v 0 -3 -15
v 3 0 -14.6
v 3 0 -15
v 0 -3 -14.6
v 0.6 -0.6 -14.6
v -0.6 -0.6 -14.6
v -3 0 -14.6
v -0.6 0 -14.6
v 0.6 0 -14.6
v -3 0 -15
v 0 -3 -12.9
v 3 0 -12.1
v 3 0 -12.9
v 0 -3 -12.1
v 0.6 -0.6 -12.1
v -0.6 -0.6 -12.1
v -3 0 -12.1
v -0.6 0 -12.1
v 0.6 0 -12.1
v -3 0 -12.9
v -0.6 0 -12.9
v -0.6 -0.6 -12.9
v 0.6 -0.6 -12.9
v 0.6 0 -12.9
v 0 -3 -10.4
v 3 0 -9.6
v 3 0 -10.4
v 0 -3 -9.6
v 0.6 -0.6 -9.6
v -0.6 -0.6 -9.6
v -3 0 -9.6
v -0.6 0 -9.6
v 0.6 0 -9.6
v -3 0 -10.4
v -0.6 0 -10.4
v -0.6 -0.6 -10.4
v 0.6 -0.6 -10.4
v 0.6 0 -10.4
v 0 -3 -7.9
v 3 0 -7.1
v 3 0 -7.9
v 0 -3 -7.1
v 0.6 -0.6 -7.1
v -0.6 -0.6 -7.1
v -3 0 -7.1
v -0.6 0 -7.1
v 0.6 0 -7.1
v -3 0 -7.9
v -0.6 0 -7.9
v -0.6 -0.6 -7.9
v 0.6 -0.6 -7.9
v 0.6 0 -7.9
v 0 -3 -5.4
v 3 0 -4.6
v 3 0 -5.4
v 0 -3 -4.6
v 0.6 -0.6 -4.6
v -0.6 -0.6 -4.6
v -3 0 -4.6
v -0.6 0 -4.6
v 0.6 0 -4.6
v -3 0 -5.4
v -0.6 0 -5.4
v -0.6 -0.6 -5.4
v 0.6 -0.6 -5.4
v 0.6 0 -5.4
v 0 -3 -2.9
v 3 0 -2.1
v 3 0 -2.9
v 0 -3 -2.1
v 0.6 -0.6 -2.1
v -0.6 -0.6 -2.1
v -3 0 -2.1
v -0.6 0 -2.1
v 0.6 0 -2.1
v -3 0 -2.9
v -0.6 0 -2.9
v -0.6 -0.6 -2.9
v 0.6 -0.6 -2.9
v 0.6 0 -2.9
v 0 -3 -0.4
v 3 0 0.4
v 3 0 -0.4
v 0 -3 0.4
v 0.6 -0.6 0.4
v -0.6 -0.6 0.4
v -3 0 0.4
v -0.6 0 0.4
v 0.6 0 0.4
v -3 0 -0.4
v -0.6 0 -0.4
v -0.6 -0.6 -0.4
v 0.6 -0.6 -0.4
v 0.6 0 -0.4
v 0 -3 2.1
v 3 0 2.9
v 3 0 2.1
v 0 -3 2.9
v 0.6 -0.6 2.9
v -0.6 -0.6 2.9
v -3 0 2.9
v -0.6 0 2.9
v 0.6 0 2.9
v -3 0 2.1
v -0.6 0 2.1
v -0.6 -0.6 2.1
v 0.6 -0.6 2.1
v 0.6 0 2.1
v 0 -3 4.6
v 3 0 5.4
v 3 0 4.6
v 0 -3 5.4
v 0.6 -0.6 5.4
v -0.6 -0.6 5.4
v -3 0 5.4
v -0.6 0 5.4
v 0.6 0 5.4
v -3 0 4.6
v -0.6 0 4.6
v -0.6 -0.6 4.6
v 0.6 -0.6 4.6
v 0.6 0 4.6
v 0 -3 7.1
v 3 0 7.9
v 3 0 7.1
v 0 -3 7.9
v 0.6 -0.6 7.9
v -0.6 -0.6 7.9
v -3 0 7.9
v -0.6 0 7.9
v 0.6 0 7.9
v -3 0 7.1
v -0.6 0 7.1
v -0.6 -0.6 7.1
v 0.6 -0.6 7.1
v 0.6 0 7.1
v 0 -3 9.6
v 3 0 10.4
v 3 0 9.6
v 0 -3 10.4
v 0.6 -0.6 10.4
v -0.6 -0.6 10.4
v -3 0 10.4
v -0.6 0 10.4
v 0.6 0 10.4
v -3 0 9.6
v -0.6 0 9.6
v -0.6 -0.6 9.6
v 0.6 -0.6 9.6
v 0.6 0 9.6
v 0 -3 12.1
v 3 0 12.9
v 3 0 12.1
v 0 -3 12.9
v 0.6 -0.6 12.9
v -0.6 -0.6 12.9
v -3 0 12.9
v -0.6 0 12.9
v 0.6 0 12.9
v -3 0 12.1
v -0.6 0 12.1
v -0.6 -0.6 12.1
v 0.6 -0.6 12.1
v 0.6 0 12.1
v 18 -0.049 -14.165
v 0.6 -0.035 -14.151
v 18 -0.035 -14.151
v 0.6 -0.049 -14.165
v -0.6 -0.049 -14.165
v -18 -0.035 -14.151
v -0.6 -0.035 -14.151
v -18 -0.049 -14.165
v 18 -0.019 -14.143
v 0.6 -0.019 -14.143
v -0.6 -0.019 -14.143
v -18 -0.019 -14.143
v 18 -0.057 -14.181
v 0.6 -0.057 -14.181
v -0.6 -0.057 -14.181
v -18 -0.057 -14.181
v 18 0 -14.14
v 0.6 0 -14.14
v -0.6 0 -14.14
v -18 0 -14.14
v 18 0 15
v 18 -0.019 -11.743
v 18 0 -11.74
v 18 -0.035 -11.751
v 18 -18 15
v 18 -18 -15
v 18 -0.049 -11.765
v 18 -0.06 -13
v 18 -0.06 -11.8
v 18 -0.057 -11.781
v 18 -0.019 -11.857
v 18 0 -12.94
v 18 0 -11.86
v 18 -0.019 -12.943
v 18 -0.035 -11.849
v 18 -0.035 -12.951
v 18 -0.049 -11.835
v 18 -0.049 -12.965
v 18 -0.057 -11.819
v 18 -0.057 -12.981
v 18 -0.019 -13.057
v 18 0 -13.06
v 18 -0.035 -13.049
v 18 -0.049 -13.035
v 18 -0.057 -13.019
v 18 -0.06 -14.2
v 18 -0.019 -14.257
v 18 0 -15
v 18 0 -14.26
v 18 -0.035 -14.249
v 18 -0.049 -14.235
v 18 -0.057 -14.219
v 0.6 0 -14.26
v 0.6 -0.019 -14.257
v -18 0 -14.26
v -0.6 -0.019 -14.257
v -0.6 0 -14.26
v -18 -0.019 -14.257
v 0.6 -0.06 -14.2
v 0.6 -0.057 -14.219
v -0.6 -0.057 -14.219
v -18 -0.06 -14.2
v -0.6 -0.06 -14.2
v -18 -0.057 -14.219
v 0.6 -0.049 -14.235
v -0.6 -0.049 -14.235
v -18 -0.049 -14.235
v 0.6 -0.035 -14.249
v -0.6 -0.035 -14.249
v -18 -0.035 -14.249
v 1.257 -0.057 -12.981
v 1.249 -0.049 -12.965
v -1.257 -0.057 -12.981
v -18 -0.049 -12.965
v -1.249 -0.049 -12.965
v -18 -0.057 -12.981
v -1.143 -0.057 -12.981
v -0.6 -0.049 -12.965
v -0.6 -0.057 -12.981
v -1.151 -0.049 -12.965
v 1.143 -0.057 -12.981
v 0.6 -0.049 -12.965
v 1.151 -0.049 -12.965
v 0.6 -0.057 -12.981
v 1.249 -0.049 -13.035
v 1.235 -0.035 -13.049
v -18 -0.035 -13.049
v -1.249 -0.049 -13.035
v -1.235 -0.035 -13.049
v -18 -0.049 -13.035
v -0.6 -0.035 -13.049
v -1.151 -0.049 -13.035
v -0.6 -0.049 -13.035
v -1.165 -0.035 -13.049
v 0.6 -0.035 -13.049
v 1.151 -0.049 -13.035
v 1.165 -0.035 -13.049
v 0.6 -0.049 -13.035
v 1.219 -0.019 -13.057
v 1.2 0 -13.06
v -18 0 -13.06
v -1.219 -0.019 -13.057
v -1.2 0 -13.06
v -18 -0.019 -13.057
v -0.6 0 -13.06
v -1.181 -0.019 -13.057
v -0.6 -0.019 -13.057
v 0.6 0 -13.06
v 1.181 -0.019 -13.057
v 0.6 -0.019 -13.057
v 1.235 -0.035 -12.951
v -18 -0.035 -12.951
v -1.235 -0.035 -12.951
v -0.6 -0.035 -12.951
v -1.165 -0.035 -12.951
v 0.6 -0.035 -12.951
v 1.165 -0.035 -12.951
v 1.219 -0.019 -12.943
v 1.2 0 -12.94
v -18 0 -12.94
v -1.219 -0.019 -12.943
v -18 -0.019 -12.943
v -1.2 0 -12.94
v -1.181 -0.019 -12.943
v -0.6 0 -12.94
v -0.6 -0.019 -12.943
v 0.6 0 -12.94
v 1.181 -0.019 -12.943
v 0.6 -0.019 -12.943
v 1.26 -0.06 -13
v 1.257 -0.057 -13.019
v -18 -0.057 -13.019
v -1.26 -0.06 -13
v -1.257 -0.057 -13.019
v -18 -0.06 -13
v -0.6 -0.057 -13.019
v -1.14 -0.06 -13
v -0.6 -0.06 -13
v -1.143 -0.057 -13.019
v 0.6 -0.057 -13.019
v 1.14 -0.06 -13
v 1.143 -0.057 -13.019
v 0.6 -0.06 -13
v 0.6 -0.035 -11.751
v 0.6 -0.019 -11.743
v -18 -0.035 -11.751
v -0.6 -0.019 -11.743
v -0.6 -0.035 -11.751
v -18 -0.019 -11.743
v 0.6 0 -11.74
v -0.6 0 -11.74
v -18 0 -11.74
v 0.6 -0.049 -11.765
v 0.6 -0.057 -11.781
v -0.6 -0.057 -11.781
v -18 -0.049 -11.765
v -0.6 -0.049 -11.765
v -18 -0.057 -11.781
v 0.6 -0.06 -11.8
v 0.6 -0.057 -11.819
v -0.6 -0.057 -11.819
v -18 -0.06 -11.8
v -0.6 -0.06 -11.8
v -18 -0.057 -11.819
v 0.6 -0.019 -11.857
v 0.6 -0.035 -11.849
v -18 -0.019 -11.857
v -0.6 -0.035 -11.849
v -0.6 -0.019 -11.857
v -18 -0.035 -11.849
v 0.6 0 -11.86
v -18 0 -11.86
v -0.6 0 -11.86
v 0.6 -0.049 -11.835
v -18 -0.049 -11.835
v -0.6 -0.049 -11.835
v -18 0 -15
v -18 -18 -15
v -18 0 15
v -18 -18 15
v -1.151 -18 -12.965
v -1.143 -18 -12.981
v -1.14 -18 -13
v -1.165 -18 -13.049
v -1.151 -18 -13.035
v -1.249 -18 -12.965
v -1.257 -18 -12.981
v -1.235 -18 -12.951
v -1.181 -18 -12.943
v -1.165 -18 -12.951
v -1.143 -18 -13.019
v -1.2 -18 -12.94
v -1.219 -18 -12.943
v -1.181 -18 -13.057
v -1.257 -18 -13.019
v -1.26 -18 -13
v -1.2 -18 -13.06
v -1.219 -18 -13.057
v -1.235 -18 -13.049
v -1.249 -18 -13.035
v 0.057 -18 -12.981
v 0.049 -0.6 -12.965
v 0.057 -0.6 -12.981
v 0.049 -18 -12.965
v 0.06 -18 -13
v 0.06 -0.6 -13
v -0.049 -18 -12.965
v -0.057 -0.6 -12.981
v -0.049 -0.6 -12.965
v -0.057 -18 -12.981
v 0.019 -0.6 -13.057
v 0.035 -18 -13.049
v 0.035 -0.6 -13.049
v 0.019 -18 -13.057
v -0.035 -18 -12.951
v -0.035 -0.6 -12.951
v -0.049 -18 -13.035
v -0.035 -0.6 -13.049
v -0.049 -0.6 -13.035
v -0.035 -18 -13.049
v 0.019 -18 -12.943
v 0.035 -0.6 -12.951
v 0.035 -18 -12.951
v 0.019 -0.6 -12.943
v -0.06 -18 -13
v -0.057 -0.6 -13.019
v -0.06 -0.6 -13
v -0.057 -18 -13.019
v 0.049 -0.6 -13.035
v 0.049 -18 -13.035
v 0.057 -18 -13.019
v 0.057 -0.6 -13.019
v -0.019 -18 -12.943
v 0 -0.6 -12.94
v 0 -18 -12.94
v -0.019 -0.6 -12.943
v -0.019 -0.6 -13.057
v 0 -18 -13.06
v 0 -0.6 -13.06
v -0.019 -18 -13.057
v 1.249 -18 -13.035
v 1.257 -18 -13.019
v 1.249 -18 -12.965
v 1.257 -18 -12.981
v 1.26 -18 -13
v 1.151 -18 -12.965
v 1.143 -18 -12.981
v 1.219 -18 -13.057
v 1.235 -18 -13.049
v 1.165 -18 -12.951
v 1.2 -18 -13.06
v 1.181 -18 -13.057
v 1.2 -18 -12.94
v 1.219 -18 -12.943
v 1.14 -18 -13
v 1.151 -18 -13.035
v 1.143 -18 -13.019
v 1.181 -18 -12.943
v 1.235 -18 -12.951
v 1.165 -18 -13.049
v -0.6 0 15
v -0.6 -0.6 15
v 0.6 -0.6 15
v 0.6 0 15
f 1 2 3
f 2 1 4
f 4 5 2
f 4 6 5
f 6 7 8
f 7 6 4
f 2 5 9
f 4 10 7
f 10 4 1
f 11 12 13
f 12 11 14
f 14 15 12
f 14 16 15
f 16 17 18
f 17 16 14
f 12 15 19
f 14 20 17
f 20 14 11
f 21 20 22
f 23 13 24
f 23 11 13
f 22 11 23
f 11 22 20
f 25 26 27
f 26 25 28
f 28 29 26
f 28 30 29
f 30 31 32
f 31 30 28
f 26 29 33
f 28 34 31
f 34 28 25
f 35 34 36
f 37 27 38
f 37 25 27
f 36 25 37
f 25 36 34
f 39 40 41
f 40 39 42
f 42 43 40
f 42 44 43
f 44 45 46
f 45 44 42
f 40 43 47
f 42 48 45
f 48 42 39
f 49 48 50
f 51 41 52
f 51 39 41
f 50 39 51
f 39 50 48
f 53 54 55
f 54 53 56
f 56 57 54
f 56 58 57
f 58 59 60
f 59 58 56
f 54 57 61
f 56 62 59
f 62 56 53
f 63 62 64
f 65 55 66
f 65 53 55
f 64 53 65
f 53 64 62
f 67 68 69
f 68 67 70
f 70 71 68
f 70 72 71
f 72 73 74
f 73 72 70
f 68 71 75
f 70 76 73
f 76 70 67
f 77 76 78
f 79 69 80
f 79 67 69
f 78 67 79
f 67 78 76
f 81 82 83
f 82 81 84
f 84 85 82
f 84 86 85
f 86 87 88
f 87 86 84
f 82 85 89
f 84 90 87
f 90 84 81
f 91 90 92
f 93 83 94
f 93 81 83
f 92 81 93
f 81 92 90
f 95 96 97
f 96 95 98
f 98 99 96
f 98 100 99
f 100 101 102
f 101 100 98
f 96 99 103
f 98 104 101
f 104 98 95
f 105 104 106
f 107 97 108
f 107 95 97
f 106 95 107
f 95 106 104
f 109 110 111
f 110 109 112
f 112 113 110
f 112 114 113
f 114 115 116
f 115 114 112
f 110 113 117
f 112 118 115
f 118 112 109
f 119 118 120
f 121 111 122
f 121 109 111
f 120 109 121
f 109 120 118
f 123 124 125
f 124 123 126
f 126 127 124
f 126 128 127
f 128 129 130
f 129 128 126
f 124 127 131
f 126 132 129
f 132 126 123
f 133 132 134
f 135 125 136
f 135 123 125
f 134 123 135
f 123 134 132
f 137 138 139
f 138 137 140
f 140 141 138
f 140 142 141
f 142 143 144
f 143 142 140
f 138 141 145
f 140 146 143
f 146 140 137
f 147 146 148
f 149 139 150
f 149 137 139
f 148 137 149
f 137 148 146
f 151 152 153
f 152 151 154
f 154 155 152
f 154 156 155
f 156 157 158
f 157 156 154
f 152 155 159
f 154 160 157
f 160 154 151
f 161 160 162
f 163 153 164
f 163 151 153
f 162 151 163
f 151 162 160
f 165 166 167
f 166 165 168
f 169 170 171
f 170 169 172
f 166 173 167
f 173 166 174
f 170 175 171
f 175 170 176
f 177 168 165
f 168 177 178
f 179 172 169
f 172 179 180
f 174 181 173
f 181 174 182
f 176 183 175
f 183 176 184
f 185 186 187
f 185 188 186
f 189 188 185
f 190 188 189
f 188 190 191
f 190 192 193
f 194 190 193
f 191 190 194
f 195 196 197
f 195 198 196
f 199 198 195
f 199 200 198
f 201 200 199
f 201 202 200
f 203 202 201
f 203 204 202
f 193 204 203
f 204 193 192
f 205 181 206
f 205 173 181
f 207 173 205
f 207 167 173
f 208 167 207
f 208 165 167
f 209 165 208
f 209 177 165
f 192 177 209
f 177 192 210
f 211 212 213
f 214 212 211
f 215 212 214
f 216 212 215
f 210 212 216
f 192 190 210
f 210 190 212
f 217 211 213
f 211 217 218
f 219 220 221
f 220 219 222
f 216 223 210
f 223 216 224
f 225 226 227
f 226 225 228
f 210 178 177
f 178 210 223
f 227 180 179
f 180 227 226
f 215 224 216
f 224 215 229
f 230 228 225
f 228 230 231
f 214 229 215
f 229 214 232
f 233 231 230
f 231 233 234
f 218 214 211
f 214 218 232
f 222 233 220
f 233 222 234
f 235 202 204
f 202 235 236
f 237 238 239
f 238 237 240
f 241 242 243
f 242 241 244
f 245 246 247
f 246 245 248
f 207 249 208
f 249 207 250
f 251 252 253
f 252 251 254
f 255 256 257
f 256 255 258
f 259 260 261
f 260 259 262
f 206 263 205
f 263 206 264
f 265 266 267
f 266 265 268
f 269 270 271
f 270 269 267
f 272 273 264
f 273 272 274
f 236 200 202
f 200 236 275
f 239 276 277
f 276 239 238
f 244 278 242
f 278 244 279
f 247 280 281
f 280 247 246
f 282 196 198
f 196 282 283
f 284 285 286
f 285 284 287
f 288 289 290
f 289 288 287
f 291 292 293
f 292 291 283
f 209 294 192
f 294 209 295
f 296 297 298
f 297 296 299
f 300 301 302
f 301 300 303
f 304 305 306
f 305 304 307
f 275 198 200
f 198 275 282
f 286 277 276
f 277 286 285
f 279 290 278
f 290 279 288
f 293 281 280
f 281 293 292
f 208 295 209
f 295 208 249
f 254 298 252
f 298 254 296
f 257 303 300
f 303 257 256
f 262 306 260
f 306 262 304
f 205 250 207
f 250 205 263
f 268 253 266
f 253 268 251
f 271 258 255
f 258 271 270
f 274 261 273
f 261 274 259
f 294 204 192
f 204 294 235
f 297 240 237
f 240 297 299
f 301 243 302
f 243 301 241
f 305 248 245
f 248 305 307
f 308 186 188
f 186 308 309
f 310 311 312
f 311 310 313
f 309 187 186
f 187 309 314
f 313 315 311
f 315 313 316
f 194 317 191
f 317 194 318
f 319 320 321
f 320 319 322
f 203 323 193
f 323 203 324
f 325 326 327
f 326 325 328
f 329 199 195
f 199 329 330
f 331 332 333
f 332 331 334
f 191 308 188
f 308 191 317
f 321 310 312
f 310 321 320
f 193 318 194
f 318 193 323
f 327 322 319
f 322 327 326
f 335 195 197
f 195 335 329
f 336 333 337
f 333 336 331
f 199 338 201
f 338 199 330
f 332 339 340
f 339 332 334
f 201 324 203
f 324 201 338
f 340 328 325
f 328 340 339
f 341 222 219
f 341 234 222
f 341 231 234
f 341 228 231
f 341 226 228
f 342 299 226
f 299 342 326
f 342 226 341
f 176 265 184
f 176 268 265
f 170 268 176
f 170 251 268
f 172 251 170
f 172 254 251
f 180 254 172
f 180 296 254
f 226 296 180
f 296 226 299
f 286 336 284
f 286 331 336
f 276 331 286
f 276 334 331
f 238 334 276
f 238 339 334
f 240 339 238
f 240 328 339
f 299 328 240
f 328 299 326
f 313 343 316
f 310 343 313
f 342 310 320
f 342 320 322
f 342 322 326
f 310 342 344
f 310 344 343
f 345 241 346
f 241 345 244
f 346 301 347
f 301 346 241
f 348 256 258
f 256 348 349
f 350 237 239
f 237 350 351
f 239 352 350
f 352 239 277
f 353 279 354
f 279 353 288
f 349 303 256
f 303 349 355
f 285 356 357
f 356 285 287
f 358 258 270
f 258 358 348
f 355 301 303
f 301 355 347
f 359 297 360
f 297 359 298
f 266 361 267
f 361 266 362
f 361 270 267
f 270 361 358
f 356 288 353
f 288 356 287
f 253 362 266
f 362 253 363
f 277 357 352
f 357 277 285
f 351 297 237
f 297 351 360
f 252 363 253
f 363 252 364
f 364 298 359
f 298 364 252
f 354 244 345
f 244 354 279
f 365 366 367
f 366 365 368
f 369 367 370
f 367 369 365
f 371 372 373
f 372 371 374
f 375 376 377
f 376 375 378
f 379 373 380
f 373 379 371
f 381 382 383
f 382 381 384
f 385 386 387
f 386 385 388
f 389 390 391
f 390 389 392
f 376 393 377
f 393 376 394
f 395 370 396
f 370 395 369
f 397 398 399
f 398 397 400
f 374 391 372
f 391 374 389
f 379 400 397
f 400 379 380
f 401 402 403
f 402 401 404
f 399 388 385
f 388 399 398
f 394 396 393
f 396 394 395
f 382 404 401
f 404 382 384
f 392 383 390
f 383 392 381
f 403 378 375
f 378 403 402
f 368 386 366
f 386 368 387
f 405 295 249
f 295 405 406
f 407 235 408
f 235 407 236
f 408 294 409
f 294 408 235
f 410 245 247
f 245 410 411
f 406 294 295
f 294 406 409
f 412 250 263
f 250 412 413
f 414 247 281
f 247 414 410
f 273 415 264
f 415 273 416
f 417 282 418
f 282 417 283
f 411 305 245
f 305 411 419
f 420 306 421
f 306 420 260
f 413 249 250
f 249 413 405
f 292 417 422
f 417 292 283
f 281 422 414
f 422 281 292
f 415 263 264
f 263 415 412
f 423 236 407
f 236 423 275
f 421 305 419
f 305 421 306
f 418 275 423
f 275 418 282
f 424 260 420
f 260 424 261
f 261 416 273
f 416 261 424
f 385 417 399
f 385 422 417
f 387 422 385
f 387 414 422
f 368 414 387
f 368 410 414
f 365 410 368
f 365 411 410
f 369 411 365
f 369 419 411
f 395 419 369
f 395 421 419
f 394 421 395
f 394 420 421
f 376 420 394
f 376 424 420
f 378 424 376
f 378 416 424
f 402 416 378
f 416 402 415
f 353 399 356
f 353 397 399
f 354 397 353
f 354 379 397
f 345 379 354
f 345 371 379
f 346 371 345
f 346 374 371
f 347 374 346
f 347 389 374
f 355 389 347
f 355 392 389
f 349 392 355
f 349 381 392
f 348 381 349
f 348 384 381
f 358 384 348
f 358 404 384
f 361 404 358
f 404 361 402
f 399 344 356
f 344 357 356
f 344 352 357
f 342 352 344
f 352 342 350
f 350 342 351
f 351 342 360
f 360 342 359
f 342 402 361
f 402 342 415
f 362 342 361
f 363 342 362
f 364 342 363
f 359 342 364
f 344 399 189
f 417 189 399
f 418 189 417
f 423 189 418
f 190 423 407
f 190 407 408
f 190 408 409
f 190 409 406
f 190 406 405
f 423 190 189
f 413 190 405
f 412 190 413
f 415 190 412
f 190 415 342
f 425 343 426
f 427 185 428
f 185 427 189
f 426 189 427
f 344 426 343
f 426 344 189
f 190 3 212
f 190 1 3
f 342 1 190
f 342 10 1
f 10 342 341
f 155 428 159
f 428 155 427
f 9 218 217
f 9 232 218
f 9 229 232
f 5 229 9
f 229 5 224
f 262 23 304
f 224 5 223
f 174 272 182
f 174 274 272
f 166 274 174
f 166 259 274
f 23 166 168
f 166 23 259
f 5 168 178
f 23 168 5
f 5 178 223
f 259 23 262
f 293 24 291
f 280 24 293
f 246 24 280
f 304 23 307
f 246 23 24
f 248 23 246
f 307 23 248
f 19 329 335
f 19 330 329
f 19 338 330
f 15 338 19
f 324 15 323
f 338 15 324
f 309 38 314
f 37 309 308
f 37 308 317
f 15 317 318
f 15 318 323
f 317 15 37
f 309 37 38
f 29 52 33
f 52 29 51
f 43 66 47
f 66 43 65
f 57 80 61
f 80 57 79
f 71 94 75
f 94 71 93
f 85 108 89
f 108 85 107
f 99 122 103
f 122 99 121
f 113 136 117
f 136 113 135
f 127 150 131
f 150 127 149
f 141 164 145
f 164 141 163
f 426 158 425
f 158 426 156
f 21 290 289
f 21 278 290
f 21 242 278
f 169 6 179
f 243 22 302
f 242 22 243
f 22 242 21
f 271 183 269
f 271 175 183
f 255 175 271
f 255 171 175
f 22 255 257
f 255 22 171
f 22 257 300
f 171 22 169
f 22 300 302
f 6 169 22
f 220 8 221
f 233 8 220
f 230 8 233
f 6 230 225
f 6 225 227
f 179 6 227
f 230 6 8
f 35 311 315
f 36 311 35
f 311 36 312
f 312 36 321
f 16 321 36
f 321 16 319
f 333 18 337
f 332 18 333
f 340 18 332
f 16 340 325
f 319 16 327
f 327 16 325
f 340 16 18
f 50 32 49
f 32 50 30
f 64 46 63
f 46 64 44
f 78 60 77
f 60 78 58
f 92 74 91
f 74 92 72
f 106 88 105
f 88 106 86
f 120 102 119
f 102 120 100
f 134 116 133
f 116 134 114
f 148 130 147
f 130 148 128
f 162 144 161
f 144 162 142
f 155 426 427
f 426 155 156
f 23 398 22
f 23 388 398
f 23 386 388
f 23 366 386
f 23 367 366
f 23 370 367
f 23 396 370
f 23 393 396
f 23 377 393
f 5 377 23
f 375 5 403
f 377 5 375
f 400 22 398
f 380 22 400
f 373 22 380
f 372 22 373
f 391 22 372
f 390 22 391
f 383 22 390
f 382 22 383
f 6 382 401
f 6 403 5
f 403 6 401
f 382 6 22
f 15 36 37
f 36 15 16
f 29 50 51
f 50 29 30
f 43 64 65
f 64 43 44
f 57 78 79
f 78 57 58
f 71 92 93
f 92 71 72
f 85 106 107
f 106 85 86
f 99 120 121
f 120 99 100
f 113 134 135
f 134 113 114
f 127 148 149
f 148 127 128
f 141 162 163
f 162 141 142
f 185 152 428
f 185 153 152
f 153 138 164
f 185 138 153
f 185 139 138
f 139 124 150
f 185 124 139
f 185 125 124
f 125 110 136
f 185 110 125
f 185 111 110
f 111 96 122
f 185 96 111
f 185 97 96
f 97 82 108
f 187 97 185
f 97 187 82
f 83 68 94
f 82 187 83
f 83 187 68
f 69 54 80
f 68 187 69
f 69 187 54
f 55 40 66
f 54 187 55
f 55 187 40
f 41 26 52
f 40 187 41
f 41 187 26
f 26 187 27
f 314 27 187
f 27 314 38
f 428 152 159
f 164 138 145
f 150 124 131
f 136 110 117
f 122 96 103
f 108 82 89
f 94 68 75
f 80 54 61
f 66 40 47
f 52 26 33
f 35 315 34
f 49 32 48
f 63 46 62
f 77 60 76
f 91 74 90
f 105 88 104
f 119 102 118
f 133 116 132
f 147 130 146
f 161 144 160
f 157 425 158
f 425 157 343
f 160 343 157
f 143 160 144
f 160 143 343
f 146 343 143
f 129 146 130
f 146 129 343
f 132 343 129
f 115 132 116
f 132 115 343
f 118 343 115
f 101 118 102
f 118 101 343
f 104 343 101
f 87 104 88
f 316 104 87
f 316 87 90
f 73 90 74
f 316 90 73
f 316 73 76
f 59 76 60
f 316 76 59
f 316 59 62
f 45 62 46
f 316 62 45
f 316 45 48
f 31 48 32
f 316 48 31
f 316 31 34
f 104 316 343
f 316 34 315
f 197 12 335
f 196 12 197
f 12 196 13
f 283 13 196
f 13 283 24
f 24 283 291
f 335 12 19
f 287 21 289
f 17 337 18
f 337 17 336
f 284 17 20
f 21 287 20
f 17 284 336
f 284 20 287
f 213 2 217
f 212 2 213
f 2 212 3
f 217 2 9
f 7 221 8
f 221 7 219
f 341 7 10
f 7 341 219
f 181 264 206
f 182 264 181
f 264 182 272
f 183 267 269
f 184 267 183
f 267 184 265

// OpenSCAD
// Matrix Biomimetic Utilities - Revelation-Class Cube Extrusion Engine
// Version 1.0.0-Revelation Core | Harmonic Cube-Clamping Fluid Matrix
// System Core: Zero-Contamination Fluid Shield (Nozzle-Less Mid-Air Boundary)

// ============================================================================
// 🏛️ GLOBAL PARAMETRIC VARIABLES & CUBIC BOUNDARIES
// ============================================================================
CHAMBER_CUBE_SIDE = 12.0; // Symmetrical dimension matching text framework parameters (mm)
CORE_APERTURE_W = 1.20;   // Precise central square inlet width for viscous resin (mm)
JET_DIAMETER = 0.12;      // Laser-drilled diameter of cardinal pneumatic gates (mm)
LAYER_STEP_H = 2.50;      // Vertical height height thickness of individual strata layers (mm)

// 🖨️ PROTOTYPE VIEW SELECTOR
// PREVIEW_MODE: 0 = Full Manifold Solid Cross-Section, 1 = Internal Fluid Core Path ONLY
PREVIEW_MODE = 0;

if (PREVIEW_MODE == 0) {
    difference() {
        Revelation_Manifold_Block();
        // Symmetrical cutting plane to display the internal pneumatic gates in the viewport
        translate([0, 50, 0]) cube([100, 100, 100], center=true);
    }
} else if (PREVIEW_MODE == 1) {
    %Fluid_Core_Pneumatic_Shield_Path();
}

// ============================================================================
// ⚙️ HYDRODYNAMIC EXTENSION ENGINE MODULES
// ============================================================================

module Revelation_Manifold_Block() {
    // Perfect structural cube housing the 12-layer cascading foundation matrix
    difference() {
        cube([CHAMBER_CUBE_SIDE*3, CHAMBER_CUBE_SIDE*3, LAYER_STEP_H*12], center=true);
        
        // Central Incompressible Viscous Golden Core Material Track
        cube([CORE_APERTURE_W, CORE_APERTURE_W, LAYER_STEP_H*12.2], center=true);
        
        // 🧬 FOUNDATION MATRIX: 12 Micro-Stepped Fluid Pressure Strata Chambers
        // Stacked vertically to dampen material internal shear stresses step-by-step
        for (strata_layer = [-6 : 5]) {
            translate([0, 0, strata_layer * LAYER_STEP_H])
                cylinder(h=0.8, r=CORE_APERTURE_W*2.5, center=true, $fn=4); // Diamond dampening wells
        }
        
        // 🔒 THE 12 CARDINAL SEAMLESS PRESSURE GATES (3 Per Wall Profile)
        // Dispatched at the final exit nozzle plane to cross-clamp the fluid into flat walls
        translate([0, 0, -(LAYER_STEP_H*6) + 2.0]) {
            // East Gates Array (3 Parallel Jets)
            translate([CHAMBER_CUBE_SIDE*1.5, 0, 0])
                rotate([0, -90, 0]) Cardinal_Jet_Trio();
                
            // West Gates Array (3 Parallel Jets)
            translate([-CHAMBER_CUBE_SIDE*1.5, 0, 0])
                rotate([0, 90, 0]) Cardinal_Jet_Trio();
                
            // North Gates Array (3 Parallel Jets)
            translate([0, CHAMBER_CUBE_SIDE*1.5, 0])
                rotate([90, 0, 0]) Cardinal_Jet_Trio();
                
            // South Gates Array (3 Parallel Jets)
            translate([0, -CHAMBER_CUBE_SIDE*1.5, 0])
                rotate([-90, 0, 0]) Cardinal_Jet_Trio();
        }
    }
}

module Cardinal_Jet_Trio() {
    // Generates three micro-metered high-pressure pneumatic channels side-by-side.
    // The center jet flattens the material face, while the flanking jets pin the corners.
    for (x_offset = [-CORE_APERTURE_W, 0, CORE_APERTURE_W]) {
        translate([x_offset, 0, 0])
            cylinder(h=CHAMBER_CUBE_SIDE*2, r=JET_DIAMETER*0.5, center=false, $fn=20);
    }
}

module Fluid_Core_Pneumatic_Shield_Path() {
    // Visual placeholder representing the wall-less fluid cube tracking shape
    union() {
        // Upper raw unaligned material stream
        color("Gold") cube([CORE_APERTURE_W, CORE_APERTURE_W, LAYER_STEP_H*8], center=true);
        // Lower compressed, immaculate cubic beam floating inside the 12-gate air box
        translate([0, 0, -LAYER_STEP_H*4])
            color("Cyan") cube([CORE_APERTURE_W*0.82, CORE_APERTURE_W*0.82, LAYER_STEP_H*4], center=true);
    }
}
